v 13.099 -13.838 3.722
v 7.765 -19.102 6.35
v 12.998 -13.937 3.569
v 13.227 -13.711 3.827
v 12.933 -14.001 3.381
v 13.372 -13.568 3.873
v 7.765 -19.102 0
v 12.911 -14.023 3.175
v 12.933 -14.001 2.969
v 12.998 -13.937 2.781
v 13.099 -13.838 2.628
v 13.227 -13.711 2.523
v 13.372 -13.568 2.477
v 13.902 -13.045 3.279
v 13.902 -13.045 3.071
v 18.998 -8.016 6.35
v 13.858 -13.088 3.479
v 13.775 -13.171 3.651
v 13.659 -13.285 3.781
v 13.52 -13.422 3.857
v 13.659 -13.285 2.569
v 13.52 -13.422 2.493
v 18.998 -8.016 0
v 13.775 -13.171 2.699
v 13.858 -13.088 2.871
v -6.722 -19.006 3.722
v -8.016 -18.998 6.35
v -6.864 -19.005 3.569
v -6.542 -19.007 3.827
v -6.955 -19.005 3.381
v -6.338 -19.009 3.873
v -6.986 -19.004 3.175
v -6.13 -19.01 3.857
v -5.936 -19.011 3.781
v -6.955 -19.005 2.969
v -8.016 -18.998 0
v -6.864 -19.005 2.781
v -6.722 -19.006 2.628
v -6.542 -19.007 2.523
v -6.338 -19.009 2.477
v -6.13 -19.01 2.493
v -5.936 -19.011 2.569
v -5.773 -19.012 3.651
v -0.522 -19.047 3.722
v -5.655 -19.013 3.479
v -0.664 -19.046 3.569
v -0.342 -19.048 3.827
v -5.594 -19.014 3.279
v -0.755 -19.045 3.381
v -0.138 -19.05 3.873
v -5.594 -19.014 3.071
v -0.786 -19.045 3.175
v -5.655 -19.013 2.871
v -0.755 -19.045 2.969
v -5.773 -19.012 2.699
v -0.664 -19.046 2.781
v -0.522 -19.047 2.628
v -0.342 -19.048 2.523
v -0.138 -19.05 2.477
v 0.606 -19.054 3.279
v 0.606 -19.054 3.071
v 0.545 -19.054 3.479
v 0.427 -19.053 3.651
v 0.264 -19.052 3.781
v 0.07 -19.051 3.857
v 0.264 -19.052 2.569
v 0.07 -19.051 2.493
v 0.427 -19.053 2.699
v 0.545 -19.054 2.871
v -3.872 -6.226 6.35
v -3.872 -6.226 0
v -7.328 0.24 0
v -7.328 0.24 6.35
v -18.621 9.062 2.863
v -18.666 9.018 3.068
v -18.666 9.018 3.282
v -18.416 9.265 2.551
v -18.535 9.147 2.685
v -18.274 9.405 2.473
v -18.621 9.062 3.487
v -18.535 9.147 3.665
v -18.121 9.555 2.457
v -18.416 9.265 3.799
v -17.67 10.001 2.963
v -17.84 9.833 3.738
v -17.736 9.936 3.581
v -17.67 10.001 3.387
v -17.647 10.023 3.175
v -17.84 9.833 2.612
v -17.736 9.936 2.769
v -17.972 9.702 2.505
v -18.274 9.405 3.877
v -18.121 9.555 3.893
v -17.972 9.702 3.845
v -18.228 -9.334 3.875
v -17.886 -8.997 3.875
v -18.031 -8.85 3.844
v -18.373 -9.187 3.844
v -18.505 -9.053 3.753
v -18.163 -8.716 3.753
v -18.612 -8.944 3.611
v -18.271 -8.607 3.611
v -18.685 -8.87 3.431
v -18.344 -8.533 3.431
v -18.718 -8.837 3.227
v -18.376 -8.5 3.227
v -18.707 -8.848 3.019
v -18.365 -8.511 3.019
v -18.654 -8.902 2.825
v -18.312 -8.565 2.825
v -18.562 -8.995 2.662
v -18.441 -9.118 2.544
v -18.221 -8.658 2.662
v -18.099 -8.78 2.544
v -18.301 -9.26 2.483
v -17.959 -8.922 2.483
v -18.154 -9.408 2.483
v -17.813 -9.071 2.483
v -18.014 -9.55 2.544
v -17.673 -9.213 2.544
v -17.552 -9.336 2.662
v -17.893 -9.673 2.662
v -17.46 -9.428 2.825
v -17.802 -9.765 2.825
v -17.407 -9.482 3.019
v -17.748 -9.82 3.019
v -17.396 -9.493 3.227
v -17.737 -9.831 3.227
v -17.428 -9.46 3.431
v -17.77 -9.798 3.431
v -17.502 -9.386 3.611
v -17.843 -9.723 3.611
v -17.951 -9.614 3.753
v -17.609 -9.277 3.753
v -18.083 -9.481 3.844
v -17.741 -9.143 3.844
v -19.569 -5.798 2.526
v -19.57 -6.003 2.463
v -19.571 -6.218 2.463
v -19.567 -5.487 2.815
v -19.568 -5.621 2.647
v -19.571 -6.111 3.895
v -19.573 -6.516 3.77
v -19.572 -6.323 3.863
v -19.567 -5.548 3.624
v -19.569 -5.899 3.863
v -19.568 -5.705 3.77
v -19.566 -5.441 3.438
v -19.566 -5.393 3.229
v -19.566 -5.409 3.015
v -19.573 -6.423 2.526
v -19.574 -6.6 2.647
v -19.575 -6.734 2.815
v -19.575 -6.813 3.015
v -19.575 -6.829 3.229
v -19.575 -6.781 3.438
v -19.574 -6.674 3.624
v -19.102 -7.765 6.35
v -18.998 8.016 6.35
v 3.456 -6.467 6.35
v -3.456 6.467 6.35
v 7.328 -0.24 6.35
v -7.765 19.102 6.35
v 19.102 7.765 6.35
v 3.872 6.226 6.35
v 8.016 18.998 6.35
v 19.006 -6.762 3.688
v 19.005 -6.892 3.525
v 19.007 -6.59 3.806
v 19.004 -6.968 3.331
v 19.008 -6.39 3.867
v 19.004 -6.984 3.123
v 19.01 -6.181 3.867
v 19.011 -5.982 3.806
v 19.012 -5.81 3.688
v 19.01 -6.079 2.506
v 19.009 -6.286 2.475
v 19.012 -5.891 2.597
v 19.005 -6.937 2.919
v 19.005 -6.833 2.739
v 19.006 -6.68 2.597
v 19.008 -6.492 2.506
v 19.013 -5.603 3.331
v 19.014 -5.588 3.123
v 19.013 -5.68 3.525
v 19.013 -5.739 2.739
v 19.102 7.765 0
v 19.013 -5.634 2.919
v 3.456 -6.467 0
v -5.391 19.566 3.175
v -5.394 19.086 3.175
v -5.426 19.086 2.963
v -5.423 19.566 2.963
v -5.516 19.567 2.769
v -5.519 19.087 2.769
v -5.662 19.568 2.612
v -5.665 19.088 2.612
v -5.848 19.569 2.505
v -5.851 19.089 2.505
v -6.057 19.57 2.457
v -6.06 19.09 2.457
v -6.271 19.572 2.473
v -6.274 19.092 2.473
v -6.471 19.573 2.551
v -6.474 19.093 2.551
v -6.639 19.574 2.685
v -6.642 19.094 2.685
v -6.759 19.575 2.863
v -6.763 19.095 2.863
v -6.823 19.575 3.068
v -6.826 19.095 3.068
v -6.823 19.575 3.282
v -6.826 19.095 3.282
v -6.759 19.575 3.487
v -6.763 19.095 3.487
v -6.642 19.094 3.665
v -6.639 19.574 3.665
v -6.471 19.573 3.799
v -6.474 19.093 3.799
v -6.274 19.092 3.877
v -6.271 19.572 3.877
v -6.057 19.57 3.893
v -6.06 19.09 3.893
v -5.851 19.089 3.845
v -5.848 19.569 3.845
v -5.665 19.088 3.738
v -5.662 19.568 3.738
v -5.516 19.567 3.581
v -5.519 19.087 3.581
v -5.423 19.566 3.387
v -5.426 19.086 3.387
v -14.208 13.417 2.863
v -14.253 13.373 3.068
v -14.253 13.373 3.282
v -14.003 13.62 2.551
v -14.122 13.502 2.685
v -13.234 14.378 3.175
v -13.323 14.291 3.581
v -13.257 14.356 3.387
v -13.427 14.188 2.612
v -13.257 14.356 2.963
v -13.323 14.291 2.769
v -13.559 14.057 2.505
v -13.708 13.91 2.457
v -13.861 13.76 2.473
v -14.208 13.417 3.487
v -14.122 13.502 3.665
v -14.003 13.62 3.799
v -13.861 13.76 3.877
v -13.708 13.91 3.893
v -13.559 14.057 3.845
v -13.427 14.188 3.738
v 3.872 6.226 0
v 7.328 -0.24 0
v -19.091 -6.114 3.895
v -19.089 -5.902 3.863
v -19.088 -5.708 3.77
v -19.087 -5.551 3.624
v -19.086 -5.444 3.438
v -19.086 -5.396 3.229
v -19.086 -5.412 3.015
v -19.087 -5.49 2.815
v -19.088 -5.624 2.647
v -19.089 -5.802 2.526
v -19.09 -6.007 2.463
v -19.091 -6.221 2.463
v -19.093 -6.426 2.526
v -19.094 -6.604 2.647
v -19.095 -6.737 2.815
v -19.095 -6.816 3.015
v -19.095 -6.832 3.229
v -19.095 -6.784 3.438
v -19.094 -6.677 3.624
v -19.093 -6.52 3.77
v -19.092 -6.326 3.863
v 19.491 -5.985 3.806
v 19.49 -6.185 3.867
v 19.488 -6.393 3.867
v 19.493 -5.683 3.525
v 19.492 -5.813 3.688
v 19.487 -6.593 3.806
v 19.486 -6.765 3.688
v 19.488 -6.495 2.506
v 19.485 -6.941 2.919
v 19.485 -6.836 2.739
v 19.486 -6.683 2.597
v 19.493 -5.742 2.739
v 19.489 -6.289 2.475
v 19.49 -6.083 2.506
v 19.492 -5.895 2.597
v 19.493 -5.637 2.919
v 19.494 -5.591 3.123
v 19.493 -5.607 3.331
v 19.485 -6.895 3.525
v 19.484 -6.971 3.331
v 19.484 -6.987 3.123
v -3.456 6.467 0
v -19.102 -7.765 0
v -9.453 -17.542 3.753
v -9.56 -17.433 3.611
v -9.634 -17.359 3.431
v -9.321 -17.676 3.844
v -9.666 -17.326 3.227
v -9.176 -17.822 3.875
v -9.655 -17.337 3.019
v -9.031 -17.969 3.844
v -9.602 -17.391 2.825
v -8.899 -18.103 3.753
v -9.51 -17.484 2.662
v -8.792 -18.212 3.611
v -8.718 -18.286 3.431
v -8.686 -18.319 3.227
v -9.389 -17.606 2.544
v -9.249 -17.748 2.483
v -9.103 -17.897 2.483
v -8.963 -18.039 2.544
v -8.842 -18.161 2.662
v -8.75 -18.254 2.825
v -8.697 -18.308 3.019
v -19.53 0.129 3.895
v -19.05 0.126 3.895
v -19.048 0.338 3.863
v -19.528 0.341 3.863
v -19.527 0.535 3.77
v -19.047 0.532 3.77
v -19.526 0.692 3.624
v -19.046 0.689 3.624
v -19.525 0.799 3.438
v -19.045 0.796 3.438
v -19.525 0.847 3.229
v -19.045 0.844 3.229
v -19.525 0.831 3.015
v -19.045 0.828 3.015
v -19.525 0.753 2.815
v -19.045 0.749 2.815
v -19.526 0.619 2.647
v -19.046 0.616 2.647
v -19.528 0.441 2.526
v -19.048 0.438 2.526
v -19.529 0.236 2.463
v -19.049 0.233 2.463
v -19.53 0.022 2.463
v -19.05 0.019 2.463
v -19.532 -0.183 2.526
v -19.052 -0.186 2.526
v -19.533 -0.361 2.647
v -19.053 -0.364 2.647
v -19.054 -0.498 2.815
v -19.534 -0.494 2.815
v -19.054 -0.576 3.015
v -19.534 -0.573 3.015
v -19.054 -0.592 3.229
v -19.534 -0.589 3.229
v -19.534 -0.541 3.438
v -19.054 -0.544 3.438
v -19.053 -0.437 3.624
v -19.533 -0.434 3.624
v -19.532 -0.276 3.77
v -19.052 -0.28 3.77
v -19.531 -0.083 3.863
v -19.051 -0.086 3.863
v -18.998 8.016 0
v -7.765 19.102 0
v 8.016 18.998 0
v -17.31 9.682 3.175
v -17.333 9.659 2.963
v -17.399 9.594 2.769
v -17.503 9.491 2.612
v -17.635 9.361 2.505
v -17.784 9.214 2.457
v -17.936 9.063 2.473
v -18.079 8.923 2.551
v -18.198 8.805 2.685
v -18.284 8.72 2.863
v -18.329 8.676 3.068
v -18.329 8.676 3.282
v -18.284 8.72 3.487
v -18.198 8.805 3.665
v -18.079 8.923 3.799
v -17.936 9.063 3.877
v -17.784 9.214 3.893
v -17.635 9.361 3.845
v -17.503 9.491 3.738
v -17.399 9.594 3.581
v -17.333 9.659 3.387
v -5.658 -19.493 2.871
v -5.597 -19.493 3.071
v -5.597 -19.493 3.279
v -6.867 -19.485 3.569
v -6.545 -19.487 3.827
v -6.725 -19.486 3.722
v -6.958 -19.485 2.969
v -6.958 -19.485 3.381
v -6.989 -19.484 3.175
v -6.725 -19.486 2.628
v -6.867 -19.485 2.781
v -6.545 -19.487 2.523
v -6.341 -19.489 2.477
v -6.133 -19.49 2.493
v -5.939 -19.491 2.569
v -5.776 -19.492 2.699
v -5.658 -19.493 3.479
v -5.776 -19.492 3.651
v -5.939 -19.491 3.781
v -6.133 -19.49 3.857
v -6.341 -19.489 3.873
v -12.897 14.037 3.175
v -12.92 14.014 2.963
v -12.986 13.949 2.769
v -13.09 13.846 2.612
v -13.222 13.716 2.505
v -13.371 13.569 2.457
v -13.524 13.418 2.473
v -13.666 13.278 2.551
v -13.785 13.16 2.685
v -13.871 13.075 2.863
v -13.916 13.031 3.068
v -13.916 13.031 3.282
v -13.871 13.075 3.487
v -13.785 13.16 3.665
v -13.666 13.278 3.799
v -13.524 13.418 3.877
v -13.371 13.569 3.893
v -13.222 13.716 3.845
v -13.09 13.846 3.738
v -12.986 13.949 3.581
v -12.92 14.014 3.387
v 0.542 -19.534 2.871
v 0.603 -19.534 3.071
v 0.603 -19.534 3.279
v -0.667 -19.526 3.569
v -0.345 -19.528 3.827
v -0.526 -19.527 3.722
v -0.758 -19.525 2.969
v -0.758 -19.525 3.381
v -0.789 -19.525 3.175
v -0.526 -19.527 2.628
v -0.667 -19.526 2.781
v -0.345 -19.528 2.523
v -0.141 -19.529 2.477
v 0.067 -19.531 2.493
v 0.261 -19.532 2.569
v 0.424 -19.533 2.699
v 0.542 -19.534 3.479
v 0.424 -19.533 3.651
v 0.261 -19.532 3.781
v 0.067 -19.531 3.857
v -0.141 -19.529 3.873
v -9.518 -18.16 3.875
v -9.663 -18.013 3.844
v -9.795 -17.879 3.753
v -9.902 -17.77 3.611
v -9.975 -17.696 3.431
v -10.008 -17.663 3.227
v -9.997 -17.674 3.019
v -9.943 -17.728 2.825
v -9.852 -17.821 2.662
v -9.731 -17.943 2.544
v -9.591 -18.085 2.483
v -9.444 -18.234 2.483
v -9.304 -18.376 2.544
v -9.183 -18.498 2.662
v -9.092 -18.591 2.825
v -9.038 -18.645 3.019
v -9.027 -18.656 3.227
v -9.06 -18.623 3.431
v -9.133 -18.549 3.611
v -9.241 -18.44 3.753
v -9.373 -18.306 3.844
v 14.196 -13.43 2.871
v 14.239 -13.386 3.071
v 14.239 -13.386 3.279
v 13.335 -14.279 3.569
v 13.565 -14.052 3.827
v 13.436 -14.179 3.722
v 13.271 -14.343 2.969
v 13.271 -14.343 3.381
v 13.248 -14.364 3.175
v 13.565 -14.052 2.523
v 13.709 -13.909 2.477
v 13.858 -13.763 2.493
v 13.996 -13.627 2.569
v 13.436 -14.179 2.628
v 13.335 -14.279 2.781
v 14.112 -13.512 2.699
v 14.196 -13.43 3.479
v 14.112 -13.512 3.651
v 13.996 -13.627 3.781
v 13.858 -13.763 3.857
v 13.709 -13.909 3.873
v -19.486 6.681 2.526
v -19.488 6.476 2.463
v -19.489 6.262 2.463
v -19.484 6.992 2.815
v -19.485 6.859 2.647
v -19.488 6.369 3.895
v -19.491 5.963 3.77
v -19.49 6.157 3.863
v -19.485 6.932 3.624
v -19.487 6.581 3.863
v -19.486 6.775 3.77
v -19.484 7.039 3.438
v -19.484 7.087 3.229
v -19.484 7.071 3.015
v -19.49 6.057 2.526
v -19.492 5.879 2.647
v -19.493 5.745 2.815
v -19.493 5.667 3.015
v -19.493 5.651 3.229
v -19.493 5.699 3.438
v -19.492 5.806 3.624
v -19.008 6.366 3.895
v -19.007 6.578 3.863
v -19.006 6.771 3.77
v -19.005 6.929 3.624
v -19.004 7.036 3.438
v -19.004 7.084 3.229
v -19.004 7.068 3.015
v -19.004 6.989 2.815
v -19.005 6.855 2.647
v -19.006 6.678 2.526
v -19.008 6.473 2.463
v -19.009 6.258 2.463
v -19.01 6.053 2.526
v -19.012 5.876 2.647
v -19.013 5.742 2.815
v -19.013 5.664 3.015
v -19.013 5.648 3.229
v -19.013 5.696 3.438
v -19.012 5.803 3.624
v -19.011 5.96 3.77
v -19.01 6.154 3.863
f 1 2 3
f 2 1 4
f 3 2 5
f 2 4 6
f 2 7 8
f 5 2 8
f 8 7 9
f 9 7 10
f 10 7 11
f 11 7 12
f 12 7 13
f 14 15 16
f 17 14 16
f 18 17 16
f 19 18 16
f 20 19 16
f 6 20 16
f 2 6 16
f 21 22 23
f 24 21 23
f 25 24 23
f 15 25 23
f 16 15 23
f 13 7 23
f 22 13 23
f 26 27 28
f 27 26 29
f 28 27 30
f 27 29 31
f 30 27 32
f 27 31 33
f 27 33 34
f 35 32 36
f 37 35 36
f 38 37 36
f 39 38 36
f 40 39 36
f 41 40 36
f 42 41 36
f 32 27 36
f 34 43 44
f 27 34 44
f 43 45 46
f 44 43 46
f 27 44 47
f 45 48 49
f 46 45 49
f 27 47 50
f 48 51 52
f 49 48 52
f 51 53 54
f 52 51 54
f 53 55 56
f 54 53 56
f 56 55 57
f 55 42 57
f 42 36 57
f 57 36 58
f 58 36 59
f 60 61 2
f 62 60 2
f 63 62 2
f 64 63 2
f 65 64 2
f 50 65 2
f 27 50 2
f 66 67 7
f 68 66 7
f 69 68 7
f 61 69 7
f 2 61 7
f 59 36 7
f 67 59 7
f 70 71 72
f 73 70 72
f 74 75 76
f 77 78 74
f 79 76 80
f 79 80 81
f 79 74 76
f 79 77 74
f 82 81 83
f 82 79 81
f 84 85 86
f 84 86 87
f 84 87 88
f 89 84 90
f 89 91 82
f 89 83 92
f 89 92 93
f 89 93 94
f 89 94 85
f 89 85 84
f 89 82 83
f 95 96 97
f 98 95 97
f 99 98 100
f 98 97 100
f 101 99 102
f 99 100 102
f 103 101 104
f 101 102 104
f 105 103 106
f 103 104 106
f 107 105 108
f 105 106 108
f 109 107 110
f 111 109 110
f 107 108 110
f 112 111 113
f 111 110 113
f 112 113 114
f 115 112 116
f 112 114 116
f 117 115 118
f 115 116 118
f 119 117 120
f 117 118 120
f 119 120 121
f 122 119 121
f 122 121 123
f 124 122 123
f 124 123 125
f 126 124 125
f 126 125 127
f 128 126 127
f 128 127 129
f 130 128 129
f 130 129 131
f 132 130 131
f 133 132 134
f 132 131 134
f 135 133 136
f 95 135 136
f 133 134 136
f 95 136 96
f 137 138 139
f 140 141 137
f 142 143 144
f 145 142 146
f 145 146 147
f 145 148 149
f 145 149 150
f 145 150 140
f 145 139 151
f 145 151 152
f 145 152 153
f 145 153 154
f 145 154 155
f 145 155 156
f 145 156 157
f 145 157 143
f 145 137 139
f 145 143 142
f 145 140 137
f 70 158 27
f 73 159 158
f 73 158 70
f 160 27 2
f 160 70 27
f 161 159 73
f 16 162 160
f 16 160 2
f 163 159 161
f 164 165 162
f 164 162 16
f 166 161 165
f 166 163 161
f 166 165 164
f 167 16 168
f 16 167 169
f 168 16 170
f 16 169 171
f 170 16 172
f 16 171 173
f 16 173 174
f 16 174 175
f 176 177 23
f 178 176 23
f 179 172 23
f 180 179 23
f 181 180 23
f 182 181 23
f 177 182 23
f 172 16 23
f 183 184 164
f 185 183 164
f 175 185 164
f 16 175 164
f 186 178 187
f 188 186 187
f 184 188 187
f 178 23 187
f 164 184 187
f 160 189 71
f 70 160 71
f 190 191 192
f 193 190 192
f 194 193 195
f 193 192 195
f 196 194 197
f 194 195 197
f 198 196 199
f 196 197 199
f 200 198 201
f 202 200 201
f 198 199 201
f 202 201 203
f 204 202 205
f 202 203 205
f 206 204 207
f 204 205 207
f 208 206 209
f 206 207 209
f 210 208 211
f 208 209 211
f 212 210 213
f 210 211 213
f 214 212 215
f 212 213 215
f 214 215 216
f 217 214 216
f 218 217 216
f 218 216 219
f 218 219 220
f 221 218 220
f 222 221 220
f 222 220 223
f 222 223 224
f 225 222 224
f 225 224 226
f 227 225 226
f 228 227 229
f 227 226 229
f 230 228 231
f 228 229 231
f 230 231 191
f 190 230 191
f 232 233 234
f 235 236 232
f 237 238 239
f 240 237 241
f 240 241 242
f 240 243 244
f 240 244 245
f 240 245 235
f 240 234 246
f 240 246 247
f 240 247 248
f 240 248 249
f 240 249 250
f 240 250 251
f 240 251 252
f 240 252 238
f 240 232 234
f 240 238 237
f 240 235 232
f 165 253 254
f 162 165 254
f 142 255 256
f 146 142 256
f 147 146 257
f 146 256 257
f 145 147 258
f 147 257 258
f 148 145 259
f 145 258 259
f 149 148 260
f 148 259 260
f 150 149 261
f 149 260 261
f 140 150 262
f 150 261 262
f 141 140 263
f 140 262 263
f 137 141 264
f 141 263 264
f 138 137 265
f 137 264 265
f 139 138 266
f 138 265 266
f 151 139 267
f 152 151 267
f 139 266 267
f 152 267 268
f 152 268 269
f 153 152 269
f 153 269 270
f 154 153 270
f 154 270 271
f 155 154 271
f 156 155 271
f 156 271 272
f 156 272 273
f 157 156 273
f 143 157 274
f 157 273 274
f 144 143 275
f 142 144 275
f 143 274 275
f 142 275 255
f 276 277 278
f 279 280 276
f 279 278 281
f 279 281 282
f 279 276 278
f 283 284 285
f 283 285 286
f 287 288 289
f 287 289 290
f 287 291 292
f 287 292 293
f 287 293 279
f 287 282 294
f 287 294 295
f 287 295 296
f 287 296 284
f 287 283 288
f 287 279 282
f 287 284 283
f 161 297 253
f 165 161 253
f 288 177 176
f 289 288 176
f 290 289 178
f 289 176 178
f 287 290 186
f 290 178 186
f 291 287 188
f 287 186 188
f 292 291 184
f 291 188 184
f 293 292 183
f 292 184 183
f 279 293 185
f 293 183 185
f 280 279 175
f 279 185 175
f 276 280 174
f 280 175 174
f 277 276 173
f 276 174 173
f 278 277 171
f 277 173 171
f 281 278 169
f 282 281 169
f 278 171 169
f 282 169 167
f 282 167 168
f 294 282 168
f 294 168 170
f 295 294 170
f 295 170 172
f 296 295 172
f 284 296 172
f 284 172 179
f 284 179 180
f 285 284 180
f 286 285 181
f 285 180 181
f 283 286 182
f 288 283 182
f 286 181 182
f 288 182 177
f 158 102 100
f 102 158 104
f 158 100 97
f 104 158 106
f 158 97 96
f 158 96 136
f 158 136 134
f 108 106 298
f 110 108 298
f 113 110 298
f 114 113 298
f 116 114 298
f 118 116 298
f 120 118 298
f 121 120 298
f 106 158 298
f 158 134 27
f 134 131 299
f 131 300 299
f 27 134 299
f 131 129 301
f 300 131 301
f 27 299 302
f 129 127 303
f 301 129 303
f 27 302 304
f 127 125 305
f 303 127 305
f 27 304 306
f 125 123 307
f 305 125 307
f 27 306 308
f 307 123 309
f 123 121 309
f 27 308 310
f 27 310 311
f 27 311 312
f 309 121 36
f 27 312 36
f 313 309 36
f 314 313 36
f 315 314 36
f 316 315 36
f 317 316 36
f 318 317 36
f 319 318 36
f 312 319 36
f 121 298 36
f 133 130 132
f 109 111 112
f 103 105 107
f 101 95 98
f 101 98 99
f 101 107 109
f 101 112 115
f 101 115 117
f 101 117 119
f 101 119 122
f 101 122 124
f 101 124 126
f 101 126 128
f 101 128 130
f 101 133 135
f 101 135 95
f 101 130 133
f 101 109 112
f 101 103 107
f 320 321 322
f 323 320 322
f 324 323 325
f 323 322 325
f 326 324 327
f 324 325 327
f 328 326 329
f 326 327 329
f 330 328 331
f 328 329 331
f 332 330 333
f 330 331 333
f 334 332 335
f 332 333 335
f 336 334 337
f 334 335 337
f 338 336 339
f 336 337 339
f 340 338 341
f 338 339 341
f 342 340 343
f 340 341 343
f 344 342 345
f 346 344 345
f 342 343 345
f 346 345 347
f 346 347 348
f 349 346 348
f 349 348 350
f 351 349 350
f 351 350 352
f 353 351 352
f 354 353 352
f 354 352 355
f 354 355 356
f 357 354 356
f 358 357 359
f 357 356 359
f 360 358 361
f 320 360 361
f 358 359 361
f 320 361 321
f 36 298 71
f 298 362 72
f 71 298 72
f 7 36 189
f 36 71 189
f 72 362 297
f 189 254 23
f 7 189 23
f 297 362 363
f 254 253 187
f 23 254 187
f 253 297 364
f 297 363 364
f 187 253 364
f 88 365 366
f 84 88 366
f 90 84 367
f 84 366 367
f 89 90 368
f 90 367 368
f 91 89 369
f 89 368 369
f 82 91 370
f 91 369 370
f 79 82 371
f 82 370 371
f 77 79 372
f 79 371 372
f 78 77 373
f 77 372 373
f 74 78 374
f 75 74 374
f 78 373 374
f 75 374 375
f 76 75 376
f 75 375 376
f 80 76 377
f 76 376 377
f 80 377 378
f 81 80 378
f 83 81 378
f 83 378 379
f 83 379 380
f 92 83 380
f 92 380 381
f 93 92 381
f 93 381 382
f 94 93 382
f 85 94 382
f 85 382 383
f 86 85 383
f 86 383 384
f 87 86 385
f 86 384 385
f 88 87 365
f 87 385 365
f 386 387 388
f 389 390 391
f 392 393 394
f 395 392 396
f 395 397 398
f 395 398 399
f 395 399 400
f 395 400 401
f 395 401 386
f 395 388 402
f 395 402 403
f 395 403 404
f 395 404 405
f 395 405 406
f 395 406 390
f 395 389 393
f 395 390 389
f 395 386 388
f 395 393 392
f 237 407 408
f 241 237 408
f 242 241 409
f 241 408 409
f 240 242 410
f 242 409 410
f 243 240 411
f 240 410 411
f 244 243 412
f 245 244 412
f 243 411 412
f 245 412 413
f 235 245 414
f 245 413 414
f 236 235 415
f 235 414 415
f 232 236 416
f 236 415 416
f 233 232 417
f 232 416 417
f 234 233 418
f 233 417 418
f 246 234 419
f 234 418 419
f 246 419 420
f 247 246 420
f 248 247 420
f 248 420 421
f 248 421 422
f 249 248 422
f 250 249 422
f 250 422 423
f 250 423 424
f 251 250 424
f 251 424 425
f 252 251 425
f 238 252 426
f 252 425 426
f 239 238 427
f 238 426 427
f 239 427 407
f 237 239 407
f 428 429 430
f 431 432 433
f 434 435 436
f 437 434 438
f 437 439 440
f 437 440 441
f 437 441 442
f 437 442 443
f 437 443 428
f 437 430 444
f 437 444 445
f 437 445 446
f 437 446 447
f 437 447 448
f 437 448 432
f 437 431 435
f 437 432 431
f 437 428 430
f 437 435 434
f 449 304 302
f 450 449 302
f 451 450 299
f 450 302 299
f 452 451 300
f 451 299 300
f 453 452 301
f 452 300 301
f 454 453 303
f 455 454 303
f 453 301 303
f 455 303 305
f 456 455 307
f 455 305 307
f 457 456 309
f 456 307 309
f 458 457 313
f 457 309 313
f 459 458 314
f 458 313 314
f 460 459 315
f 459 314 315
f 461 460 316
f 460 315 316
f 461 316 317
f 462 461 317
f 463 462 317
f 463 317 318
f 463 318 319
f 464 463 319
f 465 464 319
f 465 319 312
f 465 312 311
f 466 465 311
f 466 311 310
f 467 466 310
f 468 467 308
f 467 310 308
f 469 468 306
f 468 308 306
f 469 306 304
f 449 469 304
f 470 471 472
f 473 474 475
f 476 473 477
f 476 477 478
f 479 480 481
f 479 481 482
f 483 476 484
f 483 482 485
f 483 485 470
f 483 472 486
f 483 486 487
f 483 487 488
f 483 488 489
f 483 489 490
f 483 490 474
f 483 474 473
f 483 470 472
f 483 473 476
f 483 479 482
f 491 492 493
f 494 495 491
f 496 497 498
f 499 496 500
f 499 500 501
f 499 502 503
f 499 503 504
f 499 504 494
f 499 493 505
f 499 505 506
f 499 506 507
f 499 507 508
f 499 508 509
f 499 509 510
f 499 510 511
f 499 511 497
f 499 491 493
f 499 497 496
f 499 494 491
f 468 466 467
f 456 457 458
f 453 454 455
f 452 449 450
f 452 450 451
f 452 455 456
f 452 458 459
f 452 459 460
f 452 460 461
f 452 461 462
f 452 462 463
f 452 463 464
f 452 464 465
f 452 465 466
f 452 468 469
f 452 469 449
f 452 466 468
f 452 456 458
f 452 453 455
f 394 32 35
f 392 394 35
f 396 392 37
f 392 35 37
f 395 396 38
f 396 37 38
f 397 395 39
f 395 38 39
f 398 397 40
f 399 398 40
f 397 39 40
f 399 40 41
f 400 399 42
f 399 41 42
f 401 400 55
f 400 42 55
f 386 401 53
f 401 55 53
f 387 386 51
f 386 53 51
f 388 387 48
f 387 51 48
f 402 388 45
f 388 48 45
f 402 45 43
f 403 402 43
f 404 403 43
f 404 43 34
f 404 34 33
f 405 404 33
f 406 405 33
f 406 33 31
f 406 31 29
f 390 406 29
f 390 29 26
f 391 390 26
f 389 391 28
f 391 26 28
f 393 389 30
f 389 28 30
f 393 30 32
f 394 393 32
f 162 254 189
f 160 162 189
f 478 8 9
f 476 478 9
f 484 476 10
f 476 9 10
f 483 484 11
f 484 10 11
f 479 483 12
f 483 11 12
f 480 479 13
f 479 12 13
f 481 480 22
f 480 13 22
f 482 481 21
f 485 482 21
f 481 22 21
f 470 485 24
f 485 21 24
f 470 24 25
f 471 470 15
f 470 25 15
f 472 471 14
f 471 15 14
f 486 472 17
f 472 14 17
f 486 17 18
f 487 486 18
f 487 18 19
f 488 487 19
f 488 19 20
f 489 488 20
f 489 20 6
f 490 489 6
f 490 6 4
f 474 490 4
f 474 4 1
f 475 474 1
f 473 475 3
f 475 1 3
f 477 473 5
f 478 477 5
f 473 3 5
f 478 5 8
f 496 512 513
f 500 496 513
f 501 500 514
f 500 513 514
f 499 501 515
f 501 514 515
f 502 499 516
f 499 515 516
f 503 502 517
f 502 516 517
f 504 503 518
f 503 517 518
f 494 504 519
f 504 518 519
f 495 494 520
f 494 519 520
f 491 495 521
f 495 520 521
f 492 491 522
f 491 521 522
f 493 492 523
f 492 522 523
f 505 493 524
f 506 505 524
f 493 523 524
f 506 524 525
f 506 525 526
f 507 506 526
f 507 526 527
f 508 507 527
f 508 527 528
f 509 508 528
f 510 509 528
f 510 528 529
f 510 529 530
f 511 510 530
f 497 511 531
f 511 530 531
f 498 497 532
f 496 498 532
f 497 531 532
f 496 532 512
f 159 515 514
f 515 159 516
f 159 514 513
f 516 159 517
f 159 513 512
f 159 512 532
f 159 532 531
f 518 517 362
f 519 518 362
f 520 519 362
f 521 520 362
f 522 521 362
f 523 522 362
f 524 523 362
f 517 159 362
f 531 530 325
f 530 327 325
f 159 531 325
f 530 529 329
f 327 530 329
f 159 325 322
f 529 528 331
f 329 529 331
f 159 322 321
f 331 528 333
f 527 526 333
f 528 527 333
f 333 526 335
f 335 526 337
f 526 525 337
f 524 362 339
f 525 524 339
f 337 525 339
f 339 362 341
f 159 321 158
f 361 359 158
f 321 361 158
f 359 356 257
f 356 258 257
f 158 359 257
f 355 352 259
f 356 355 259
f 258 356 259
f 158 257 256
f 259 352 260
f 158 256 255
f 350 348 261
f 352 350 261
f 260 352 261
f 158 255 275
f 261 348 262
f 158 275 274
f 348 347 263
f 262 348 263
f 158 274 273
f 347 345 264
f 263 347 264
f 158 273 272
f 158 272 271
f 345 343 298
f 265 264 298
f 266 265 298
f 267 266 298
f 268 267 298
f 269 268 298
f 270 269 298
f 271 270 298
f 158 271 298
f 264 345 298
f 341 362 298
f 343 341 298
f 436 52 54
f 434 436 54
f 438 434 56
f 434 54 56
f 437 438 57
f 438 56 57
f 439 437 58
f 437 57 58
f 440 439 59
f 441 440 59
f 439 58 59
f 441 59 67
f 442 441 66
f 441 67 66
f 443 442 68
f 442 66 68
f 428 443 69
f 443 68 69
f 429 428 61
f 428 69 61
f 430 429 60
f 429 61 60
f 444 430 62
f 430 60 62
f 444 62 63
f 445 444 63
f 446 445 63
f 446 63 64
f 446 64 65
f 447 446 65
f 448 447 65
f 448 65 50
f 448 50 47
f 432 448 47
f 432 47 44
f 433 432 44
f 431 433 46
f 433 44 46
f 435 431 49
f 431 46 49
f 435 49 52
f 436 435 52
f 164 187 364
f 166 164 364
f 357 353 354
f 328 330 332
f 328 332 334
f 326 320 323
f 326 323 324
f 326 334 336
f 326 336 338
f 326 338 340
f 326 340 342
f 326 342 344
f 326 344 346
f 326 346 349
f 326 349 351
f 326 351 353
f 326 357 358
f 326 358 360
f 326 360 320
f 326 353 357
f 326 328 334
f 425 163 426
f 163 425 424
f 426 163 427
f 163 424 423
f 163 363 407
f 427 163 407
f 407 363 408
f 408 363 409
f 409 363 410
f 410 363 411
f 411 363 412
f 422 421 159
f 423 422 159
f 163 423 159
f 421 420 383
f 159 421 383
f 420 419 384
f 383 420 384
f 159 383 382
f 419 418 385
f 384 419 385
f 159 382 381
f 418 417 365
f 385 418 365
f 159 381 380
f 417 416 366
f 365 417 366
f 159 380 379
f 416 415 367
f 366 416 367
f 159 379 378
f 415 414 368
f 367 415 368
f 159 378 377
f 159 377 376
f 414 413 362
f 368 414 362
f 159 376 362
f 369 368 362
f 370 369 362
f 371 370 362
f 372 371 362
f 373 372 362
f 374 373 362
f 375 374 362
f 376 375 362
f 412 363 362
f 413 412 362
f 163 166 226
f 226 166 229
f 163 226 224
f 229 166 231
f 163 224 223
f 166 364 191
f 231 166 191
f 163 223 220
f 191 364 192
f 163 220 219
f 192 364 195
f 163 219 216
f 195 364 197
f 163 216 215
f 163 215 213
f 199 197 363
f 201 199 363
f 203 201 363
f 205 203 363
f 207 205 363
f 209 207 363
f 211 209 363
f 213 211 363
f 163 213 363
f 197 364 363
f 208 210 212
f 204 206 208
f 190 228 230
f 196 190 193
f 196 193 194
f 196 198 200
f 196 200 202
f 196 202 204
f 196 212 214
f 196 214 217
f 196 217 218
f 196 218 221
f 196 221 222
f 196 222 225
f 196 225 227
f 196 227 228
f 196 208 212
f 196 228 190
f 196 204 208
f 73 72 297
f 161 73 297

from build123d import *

# Parameters (mm, degrees)
BOSS_EXTRUDE1_DEPTH = 6.35
SKETCH2_R           = 0.72
BOSS_EXTRUDE2_DEPTH = 0.48
SKETCH3_R           = 0.72
BOSS_EXTRUDE3_DEPTH = 0.48
SKETCH4_R           = 0.72
BOSS_EXTRUDE4_DEPTH = 0.48
SKETCH5_R           = 0.7
BOSS_EXTRUDE5_DEPTH = 0.48
SKETCH6_R           = 0.7
BOSS_EXTRUDE6_DEPTH = 0.48
SKETCH7_R           = 0.7
BOSS_EXTRUDE7_DEPTH = 0.48
SKETCH8_R           = 0.7
BOSS_EXTRUDE8_DEPTH = 0.48
CUT_EXTRUDE1_DEPTH  = 7.35


with BuildPart() as part:
    # Sketch1 → Boss-Extrude1 (new body)
    with BuildSketch(Plane.XY):
        Polygon((-7.764898793, 19.101651031), (-18.997519567, 8.016294384), (-19.101651031, -7.764898793), (-8.016294384, -18.997519567), (7.764898793, -19.101651031), (18.997519567, -8.016294384), (19.101651031, 7.764898793), (8.016294384, 18.997519567), align=None)
    extrude(amount=BOSS_EXTRUDE1_DEPTH)

    # Sketch2 → Boss-Extrude2 (add)
    with BuildSketch(Plane(origin=(0.125697795, 19.049585299, 0), x_dir=(0.999978231, -0.006598309, 0), z_dir=(0.006598309, 0.999978231, 0))):
        with Locations((-6.239768363, -3.175)):
            Circle(SKETCH2_R)
    extrude(amount=BOSS_EXTRUDE2_DEPTH)

    # Sketch3 → Boss-Extrude3 (add)
    with BuildSketch(Plane(origin=(-13.38120918, 13.558972707, 0), x_dir=(0.711757097, 0.702425679, 0), z_dir=(-0.702425679, 0.711757097, 0))):
        with Locations((-6.239768363, -3.175)):
            Circle(SKETCH3_R)
        with Locations((-0.039768363, -3.175)):
            Circle(SKETCH3_R)
    extrude(amount=BOSS_EXTRUDE3_DEPTH)

    # Sketch4 → Boss-Extrude4 (add)
    with BuildSketch(Plane(origin=(-19.049585299, 0.125697795, 0), x_dir=(0, 0, 1), z_dir=(-0.999978231, 0.006598309, 0))):
        with Locations((3.175, -6.239768363)):
            Circle(SKETCH4_R)
        with Locations((3.175, 0.000224237)):
            Circle(SKETCH4_R)
        with Locations((3.175, 6.240224237)):
            Circle(SKETCH4_R)
    extrude(amount=BOSS_EXTRUDE4_DEPTH)

    # Sketch5 → Boss-Extrude5 (add)
    with BuildSketch(Plane(origin=(-13.558972707, -13.38120918, 0), x_dir=(0, 0, 1), z_dir=(-0.711757097, -0.702425679, 0))):
        with Locations((3.175, -6.239768363)):
            Circle(SKETCH5_R)
        with Locations((3.175, 6.160231637)):
            Circle(SKETCH5_R)
    extrude(amount=BOSS_EXTRUDE5_DEPTH)

    # Sketch6 → Boss-Extrude6 (add)
    with BuildSketch(Plane(origin=(-0.125697795, -19.049585299, 0), x_dir=(-0.999978231, 0.006598309, 0), z_dir=(-0.006598309, -0.999978231, 0))):
        with Locations((-0.039768363, -3.175)):
            Circle(SKETCH6_R)
        with Locations((6.160231637, -3.175)):
            Circle(SKETCH6_R)
    extrude(amount=BOSS_EXTRUDE6_DEPTH)

    # Sketch7 → Boss-Extrude7 (add)
    with BuildSketch(Plane(origin=(13.38120918, -13.558972707, 0), x_dir=(-0.711757097, -0.702425679, 0), z_dir=(0.702425679, -0.711757097, 0))):
        with Locations((-0.039768363, -3.175)):
            Circle(SKETCH7_R)
    extrude(amount=BOSS_EXTRUDE7_DEPTH)

    # Sketch8 → Boss-Extrude8 (add)
    with BuildSketch(Plane(origin=(19.049585299, -0.125697795, 0), x_dir=(0, 0, -1), z_dir=(0.999978231, -0.006598309, 0))):
        with Locations((-3.175, -6.160231637)):
            Circle(SKETCH8_R)
    extrude(amount=BOSS_EXTRUDE8_DEPTH)

    # Sketch9 → Cut-Extrude1 (cut, through all)
    with BuildSketch(Plane(origin=(0, 0, 0), x_dir=(-1, 0, 0), z_dir=(0, 0, -1))):
        Polygon((-3.872311644, 6.226438458), (-7.328409701, -0.240301026), (-3.456098057, -6.466739484), (3.872311644, -6.226438458), (7.328409701, 0.240301026), (3.456098057, 6.466739484), align=None)
    extrude(amount=-CUT_EXTRUDE1_DEPTH, mode=Mode.SUBTRACT)


solid = part.part
